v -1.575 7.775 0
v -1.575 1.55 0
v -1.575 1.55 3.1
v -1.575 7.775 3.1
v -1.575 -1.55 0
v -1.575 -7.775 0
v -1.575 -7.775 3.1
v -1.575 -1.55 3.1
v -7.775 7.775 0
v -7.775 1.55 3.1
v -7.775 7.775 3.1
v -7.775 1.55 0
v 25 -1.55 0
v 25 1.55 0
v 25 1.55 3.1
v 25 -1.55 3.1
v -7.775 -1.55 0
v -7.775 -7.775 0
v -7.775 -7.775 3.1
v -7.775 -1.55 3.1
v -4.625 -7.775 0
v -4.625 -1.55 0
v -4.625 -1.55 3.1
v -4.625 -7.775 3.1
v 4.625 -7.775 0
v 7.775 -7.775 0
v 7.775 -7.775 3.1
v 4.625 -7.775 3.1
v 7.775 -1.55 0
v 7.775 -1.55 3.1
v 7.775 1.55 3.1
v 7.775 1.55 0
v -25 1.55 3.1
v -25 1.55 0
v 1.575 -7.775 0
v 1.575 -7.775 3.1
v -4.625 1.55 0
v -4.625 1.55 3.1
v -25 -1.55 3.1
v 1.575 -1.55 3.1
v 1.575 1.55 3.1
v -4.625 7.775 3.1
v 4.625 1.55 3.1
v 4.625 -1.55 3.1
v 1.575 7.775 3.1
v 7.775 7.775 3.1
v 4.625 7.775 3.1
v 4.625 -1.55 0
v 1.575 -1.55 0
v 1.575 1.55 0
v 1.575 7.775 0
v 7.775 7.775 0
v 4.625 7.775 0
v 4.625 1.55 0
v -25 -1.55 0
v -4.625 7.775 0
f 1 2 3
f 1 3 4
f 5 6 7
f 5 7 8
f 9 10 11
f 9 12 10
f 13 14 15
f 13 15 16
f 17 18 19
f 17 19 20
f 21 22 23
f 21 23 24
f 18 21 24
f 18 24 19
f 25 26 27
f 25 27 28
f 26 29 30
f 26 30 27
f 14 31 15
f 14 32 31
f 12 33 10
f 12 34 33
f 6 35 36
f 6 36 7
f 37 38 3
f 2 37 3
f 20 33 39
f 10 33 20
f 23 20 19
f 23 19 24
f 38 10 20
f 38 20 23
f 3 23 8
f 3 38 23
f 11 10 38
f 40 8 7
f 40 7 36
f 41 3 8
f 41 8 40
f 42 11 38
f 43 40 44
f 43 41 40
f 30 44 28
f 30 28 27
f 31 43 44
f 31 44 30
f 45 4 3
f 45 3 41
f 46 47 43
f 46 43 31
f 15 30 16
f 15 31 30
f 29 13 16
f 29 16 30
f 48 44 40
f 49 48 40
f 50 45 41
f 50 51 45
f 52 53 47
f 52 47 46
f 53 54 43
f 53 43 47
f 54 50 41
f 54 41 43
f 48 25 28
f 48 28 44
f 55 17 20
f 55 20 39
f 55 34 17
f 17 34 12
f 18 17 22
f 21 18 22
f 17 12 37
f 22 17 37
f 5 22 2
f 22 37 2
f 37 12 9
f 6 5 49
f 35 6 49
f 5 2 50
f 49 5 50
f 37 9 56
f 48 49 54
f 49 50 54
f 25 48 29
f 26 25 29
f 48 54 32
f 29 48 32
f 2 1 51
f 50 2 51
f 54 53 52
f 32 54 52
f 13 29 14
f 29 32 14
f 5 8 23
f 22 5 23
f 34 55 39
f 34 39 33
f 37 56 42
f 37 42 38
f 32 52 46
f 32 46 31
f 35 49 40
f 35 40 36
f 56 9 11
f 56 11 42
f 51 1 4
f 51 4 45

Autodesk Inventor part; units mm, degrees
ref_plane "YZ Plane" through (0, 0, 0) normal (1, 0, 0) x (0, 1, 0)
ref_plane "XZ Plane" through (0, 0, 0) normal (0, 1, 0) x (-1, 0, 0)
ref_plane "XY Plane" through (0, 0, 0) normal (0, 0, 1) x (1, 0, 0)
sketch "tabs" plane through (0, 0, 0) normal (0, 0, 1) x (1, 0, 0)
  line L0 (15.6175, 17.0118) -> (18.7675, 17.0118)
  line L1 (18.7675, 17.0118) -> (18.7675, 10.7868)
  line L2 (18.7675, 10.7868) -> (15.6175, 10.7868)
  line L3 (15.6175, 10.7868) -> (15.6175, 17.0118)
  line L4 (21.8175, 17.0118) -> (24.9675, 17.0118)
  line L5 (24.9675, 17.0118) -> (24.9675, 10.7868)
  line L6 (24.9675, 10.7868) -> (21.8175, 10.7868)
  line L7 (21.8175, 10.7868) -> (21.8175, 17.0118)
  line L8 (28.0175, 17.0118) -> (31.1675, 17.0118)
  line L9 (31.1675, 17.0118) -> (31.1675, 10.7868)
  line L10 (31.1675, 10.7868) -> (28.0175, 10.7868)
  line L11 (28.0175, 10.7868) -> (28.0175, 17.0118)
  line L12 (23.3925, 10.7868) -> (23.3925, 8.8536) construction
  point P0 (23.3925, 12.1901)
  dimension "d2" = 3.15
  dimension "d3" = 3.05
  dimension "d4" = 3.05
  dimension "d5" = 6.225
sketch "Sketch1" plane through (0, 0, 0) normal (0, 0, 1) x (1, 0, 0)
  line L0 (-25, 1.55) -> (25, 1.55)
  line L1 (25, 1.55) -> (25, -1.55)
  line L2 (25, -1.55) -> (-25, -1.55)
  line L3 (-25, -1.55) -> (-25, 1.55)
  line L4 (0, 16.9043) -> (0, -20.0235) construction
  line L5 (-32.3473, 0) -> (40.4078, 0) construction
  line L6 (-7.775, 7.775) -> (-4.625, 7.775)
  line L7 (-4.625, 7.775) -> (-4.625, 1.55)
  line L8 (-4.625, 1.55) -> (-7.775, 1.55)
  line L9 (-7.775, 1.55) -> (-7.775, 7.775)
  line L10 (-1.575, 7.775) -> (1.575, 7.775)
  line L11 (1.575, 7.775) -> (1.575, 1.55)
  line L12 (1.575, 1.55) -> (-1.575, 1.55)
  line L13 (-1.575, 1.55) -> (-1.575, 7.775)
  line L14 (4.625, 7.775) -> (7.775, 7.775)
  line L15 (7.775, 7.775) -> (7.775, 1.55)
  line L16 (7.775, 1.55) -> (4.625, 1.55)
  line L17 (4.625, 1.55) -> (4.625, 7.775)
  line L18 (0, 1.55) -> (0, -0.3832) construction
  line L19 (-7.775, -1.55) -> (-4.625, -1.55)
  line L20 (-4.625, -1.55) -> (-4.625, -7.775)
  line L21 (-4.625, -7.775) -> (-7.775, -7.775)
  line L22 (-7.775, -7.775) -> (-7.775, -1.55)
  line L23 (-1.575, -1.55) -> (1.575, -1.55)
  line L24 (1.575, -1.55) -> (1.575, -7.775)
  line L25 (1.575, -7.775) -> (-1.575, -7.775)
  line L26 (-1.575, -7.775) -> (-1.575, -1.55)
  line L27 (4.625, -1.55) -> (7.775, -1.55)
  line L28 (7.775, -1.55) -> (7.775, -7.775)
  line L29 (7.775, -7.775) -> (4.625, -7.775)
  line L30 (4.625, -7.775) -> (4.625, -1.55)
  line L31 (0, -7.775) -> (0, -9.7082) construction
  point P0 (0, 0)
  point P1 (25, 0)
  dimension "d0" = 50
  dimension "d1" = 3.1
extrude "Extrusion1" add sketch "Sketch1" along normal blind 3.1
equation "\"d2\" = mat + kerf"
equation "\"d3\" = mat - kerf"
equation "\"d4\" = mat - kerf"
equation "\"d5\" = 2 * mat + 0.5 * kerf"
equation "\"d1\" = mat"
equation "\"d6\" = mat"
equation "\"mat\" = 3.1"
equation "\"kerf\" = 0.05"
properties part number "link1"
